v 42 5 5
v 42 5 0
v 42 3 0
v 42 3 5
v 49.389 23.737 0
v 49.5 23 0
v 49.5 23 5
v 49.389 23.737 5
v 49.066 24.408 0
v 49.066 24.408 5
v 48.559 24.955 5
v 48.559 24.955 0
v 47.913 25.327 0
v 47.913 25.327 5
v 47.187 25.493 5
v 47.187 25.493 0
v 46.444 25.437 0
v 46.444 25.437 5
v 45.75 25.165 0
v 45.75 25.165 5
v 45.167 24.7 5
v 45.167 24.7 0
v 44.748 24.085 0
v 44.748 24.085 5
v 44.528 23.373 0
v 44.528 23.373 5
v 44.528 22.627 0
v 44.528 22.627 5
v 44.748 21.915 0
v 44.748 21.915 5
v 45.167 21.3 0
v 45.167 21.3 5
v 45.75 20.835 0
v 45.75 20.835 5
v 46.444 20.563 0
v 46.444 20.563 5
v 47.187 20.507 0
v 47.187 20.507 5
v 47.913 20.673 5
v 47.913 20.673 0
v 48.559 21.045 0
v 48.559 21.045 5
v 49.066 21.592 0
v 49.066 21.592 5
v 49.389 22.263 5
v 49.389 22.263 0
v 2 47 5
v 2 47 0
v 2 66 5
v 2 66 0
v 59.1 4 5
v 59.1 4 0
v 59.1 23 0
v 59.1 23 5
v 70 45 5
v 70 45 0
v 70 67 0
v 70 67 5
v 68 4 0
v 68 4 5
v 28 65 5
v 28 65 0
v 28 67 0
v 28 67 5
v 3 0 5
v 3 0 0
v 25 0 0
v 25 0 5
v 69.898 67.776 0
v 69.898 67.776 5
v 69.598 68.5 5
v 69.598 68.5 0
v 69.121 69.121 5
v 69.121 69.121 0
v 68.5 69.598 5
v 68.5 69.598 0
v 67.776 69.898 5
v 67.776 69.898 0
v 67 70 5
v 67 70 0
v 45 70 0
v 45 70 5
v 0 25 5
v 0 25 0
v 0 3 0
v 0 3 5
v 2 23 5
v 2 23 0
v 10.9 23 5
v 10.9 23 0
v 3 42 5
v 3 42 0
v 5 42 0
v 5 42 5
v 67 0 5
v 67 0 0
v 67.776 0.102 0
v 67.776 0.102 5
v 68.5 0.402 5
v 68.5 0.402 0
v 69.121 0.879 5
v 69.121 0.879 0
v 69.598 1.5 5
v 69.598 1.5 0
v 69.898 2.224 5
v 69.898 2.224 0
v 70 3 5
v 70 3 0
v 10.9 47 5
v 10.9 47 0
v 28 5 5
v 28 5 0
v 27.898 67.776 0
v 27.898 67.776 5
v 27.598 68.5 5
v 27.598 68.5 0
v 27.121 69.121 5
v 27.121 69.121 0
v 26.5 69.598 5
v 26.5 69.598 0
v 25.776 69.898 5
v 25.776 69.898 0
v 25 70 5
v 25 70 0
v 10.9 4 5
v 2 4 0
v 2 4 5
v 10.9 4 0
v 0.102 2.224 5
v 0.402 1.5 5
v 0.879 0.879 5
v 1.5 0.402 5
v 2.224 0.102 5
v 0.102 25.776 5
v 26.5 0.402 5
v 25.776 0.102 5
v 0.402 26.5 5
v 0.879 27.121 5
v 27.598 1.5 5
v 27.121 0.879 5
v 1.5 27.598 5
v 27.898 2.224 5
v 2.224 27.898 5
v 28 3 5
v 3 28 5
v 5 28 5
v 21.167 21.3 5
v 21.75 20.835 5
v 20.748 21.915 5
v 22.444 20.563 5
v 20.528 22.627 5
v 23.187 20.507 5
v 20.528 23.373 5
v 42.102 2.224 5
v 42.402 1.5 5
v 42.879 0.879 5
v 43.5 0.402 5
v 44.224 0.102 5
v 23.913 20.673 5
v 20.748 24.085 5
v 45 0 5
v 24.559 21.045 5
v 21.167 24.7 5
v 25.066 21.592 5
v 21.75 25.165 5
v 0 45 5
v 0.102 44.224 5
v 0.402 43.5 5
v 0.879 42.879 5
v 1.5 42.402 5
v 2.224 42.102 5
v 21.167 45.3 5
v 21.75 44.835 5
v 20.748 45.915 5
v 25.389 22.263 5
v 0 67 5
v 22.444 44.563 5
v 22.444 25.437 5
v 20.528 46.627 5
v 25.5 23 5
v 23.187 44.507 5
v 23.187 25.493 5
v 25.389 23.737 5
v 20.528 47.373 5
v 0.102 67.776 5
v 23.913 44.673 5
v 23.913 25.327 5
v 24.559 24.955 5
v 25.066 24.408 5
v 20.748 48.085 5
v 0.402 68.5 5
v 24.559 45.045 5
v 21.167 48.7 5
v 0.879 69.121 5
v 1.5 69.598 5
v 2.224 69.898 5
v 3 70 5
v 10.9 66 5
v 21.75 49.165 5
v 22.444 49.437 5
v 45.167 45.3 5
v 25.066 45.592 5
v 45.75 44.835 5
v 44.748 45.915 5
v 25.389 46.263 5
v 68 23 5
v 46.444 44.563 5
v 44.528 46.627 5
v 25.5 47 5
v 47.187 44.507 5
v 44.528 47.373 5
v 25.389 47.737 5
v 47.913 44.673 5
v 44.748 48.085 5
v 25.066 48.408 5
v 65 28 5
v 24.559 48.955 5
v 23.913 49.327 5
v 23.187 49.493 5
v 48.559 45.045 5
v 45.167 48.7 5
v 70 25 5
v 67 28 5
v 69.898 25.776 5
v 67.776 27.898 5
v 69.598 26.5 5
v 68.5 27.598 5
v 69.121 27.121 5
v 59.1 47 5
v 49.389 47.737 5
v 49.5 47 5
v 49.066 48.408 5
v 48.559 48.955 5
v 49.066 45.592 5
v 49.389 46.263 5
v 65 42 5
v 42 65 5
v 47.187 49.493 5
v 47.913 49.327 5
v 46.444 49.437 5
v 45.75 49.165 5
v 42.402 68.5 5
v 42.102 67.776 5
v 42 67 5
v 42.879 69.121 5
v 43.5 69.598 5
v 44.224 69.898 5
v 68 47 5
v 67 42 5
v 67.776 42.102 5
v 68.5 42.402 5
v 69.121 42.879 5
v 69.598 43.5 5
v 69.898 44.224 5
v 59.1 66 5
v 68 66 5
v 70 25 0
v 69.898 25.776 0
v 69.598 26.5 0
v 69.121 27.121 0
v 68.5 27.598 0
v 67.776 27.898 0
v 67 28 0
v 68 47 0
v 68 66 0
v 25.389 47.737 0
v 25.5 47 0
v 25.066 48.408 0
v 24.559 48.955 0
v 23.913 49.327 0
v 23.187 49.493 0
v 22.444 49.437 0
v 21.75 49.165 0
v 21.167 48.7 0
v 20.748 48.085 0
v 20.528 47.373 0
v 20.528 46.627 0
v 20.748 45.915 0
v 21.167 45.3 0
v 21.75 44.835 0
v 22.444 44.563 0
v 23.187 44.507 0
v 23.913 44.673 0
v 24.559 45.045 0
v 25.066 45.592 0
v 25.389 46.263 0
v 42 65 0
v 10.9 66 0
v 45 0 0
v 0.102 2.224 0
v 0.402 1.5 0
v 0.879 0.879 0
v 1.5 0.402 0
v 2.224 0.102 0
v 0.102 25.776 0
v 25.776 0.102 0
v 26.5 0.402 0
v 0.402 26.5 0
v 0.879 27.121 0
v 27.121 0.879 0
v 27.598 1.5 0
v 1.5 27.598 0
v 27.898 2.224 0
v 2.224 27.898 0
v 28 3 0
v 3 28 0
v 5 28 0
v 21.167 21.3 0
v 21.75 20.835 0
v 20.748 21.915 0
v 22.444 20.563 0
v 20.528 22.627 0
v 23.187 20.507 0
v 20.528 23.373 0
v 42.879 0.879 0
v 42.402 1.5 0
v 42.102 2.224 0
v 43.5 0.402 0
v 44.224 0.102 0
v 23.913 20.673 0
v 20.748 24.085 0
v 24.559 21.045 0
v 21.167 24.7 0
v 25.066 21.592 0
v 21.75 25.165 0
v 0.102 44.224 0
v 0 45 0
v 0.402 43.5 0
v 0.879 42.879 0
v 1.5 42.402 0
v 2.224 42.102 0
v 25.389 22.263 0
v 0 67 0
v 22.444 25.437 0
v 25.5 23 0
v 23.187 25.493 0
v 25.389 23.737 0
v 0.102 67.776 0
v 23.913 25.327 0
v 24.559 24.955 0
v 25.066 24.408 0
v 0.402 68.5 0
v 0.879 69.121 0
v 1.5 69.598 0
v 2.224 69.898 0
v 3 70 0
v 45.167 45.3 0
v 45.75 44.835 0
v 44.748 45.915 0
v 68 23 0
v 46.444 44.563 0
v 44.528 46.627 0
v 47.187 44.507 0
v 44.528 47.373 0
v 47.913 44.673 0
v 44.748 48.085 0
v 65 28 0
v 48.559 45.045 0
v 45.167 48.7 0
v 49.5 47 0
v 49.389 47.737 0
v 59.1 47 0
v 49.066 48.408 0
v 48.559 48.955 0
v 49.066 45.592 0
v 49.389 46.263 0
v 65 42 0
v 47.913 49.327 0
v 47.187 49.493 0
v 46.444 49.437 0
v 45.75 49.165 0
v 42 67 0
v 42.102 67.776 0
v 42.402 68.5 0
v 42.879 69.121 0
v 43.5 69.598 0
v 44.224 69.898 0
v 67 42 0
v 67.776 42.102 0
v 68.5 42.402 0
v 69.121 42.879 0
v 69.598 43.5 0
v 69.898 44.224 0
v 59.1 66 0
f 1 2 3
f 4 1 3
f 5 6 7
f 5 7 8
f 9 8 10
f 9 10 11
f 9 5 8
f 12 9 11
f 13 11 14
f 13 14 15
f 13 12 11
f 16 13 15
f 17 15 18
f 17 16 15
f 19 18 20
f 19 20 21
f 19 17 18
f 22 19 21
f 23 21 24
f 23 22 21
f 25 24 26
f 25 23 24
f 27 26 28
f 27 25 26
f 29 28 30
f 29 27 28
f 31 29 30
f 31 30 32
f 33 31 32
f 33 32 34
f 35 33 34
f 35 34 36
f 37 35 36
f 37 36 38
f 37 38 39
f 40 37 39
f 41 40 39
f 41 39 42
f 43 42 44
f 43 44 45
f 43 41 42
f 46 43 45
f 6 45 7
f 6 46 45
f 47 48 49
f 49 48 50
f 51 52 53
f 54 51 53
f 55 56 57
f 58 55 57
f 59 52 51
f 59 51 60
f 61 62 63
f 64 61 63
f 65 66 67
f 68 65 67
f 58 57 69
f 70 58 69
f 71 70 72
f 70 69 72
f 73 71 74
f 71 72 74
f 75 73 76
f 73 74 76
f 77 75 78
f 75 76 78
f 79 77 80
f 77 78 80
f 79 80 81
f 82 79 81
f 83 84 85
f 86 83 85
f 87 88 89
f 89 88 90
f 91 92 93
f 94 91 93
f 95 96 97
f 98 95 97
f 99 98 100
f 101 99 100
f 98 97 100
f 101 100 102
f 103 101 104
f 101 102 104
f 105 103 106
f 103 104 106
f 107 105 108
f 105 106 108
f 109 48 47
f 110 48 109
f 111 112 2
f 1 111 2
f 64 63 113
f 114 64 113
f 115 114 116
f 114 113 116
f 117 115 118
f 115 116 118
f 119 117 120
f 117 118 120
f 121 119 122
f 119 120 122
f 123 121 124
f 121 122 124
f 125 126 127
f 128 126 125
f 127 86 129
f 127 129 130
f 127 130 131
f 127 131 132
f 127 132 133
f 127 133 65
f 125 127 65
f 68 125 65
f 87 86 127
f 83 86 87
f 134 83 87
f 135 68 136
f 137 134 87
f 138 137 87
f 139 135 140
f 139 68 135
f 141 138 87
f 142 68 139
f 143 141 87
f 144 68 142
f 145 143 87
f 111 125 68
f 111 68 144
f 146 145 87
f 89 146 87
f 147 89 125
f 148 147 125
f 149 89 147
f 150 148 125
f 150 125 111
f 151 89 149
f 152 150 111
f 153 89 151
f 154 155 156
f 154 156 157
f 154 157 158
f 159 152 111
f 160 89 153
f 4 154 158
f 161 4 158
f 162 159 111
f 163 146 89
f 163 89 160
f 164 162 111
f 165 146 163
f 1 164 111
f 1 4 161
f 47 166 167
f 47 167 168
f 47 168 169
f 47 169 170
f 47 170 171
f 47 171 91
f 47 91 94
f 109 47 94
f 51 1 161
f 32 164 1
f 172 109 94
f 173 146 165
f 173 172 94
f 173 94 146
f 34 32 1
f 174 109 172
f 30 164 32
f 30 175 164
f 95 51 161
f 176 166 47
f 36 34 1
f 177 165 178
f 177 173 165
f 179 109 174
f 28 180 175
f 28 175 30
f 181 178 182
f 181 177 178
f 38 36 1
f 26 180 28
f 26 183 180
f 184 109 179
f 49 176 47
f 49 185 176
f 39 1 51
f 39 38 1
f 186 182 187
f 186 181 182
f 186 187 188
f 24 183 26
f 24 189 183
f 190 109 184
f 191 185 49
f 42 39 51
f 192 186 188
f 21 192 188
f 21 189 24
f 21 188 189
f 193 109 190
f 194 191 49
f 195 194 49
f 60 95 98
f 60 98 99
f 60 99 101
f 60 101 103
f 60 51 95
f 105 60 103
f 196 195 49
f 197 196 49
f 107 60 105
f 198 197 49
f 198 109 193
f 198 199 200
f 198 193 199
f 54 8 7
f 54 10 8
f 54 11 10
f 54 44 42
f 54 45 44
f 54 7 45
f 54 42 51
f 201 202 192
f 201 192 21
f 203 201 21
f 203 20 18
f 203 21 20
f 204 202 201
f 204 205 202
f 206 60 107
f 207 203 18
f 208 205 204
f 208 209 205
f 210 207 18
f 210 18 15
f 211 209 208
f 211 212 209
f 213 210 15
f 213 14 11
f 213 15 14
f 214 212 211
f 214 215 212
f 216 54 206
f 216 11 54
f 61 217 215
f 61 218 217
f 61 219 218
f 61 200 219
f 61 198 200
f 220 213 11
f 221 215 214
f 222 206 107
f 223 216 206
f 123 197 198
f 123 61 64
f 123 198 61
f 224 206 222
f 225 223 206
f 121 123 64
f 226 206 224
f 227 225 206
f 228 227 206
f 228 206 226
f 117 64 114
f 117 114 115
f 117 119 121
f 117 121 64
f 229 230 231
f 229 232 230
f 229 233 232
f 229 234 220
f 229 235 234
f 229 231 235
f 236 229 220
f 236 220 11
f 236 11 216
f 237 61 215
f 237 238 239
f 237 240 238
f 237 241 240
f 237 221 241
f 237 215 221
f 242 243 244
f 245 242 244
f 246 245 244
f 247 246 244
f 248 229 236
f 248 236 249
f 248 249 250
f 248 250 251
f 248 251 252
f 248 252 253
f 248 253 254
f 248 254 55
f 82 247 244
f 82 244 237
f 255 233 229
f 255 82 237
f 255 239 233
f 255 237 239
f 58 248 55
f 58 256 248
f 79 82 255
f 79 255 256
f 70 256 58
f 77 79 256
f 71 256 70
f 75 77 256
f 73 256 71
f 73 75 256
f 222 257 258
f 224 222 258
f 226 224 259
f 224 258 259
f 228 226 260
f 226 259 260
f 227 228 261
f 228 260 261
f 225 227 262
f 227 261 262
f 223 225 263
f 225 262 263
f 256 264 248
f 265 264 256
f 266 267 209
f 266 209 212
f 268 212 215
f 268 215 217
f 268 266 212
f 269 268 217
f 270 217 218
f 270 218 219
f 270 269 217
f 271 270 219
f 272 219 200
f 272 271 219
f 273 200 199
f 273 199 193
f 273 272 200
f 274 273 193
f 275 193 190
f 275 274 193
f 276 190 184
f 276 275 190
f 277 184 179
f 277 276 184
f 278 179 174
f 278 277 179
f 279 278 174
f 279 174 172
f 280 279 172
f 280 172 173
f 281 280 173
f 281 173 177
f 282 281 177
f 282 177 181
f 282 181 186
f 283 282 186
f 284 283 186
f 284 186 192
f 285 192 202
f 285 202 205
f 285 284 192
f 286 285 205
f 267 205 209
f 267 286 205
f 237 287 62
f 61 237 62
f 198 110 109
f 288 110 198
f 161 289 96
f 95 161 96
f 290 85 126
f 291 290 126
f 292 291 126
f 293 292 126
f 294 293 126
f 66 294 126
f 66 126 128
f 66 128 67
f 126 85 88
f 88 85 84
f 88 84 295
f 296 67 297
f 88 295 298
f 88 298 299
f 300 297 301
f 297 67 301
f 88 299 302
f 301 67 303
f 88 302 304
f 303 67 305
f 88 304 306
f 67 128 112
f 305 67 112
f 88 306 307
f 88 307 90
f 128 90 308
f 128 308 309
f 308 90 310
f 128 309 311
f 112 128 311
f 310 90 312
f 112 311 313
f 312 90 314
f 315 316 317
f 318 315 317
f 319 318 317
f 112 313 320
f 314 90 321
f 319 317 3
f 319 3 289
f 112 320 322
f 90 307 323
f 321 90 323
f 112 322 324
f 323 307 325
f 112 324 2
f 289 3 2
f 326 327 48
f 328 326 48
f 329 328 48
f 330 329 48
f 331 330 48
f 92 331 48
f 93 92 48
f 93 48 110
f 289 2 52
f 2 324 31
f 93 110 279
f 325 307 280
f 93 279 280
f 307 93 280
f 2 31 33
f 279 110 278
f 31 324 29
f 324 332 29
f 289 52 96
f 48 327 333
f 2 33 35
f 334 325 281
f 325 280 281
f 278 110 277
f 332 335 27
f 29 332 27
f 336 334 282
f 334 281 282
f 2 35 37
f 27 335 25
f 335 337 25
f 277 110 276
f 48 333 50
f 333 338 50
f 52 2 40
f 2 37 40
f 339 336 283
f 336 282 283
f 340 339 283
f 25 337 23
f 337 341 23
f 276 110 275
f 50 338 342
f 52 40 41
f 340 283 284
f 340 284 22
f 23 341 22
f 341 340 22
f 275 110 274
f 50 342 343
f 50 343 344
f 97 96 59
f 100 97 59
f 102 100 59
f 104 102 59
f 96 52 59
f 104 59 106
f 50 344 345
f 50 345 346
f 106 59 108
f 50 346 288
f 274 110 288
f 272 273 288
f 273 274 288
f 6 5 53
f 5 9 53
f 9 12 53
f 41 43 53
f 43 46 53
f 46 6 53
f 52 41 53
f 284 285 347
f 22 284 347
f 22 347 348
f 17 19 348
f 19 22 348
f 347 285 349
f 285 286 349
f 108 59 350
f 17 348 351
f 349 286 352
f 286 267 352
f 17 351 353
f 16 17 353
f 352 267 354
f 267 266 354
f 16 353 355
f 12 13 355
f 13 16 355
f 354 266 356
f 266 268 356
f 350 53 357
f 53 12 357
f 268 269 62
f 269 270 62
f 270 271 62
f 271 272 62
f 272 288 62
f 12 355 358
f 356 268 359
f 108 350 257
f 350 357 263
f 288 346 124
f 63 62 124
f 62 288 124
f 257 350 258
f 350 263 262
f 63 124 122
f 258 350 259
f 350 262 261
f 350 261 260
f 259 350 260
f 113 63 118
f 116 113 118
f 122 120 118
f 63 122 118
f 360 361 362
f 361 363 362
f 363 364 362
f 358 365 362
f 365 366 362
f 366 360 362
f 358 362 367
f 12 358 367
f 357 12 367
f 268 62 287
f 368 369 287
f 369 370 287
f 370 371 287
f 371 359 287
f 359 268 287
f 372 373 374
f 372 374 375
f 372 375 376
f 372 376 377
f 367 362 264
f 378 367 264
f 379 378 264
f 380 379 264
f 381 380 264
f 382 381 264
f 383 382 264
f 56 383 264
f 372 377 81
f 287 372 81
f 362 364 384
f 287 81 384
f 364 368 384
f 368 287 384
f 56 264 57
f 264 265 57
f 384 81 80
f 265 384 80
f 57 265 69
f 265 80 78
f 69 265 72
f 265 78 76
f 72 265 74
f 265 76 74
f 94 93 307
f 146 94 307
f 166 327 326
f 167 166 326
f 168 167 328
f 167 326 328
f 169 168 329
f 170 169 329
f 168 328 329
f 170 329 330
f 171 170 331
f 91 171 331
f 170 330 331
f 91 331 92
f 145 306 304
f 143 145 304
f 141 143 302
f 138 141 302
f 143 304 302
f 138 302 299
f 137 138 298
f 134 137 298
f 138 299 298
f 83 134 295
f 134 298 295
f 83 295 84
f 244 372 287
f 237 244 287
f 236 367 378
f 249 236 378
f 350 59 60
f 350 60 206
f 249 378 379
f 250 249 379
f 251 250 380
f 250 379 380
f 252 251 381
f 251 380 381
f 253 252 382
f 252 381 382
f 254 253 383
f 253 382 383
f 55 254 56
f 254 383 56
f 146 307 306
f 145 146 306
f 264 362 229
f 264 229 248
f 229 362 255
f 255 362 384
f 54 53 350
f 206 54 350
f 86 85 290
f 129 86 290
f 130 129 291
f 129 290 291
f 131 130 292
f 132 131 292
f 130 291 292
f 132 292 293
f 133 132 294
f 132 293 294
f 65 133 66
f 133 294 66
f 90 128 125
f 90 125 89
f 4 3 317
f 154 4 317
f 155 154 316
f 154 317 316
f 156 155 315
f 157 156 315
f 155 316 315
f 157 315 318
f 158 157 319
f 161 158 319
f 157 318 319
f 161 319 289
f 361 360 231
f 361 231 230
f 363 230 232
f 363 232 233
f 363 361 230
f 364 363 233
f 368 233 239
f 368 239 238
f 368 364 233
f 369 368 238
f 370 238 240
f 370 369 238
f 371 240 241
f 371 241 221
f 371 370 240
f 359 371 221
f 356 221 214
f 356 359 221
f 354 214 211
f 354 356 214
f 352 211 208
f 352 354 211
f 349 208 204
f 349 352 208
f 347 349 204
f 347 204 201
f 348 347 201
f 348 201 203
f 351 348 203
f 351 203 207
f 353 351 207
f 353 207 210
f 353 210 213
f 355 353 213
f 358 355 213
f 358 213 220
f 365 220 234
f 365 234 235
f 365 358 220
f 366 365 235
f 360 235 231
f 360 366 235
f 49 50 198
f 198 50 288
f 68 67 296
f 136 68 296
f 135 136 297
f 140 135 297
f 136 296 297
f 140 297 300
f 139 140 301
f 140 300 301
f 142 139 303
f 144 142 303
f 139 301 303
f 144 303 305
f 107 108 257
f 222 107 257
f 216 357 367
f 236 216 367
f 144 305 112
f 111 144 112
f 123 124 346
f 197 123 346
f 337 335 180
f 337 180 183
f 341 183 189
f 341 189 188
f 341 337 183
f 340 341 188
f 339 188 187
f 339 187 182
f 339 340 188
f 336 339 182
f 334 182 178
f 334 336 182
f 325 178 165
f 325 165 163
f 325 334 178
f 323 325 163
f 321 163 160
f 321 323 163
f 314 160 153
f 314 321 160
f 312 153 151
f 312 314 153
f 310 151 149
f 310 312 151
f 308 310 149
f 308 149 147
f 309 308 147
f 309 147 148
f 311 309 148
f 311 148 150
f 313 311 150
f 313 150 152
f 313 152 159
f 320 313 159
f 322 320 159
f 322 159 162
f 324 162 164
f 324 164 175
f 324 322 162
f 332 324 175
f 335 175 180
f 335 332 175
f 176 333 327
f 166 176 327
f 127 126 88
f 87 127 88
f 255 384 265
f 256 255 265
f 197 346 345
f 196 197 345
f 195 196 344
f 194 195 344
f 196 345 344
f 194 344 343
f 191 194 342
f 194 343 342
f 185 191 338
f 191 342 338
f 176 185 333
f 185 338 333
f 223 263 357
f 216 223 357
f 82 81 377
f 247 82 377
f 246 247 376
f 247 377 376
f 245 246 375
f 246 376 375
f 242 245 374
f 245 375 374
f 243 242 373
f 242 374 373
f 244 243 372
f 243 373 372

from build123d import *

# Parameters (mm, degrees)
SKETCH_1_R      = 2.5
SKETCH_1_W      = 8.9
SKETCH_1_H      = 19
EXTRUDE_1_DEPTH = 5


with BuildPart() as part:
    # 草图1 → 凸台-拉伸1 (new body)
    with BuildSketch(Plane.XY):
        with BuildLine():
            Line((3, 0), (25, 0))
            ThreePointArc((25, 0), (27.121320344, 0.878679656), (28, 3))
            Line((28, 3), (28, 5))
            Line((28, 5), (42, 5))
            Line((42, 5), (42, 3))
            ThreePointArc((42, 3), (42.878679656, 0.878679656), (45, 0))
            Line((45, 0), (67, 0))
            ThreePointArc((67, 0), (69.121320344, 0.878679656), (70, 3))
            Line((70, 3), (70, 25))
            ThreePointArc((70, 25), (69.121320344, 27.121320344), (67, 28))
            Line((67, 28), (65, 28))
            Line((65, 28), (65, 42))
            Line((65, 42), (67, 42))
            ThreePointArc((67, 42), (69.121320344, 42.878679656), (70, 45))
            Line((70, 45), (70, 67))
            ThreePointArc((70, 67), (69.121320344, 69.121320344), (67, 70))
            Line((67, 70), (45, 70))
            ThreePointArc((45, 70), (42.878679656, 69.121320344), (42, 67))
            Line((42, 67), (42, 65))
            Line((42, 65), (28, 65))
            Line((28, 65), (28, 67))
            ThreePointArc((28, 67), (27.121320344, 69.121320344), (25, 70))
            Line((25, 70), (3, 70))
            ThreePointArc((3, 70), (0.878679656, 69.121320344), (0, 67))
            Line((0, 67), (0, 45))
            ThreePointArc((0, 45), (0.878679656, 42.878679656), (3, 42))
            Line((3, 42), (5, 42))
            Line((5, 42), (5, 28))
            Line((5, 28), (3, 28))
            ThreePointArc((3, 28), (0.878679656, 27.121320344), (0, 25))
            Line((0, 25), (0, 3))
            ThreePointArc((0, 3), (0.878679656, 0.878679656), (3, 0))
        make_face()
        with Locations((23, 47)):
            Circle(SKETCH_1_R, mode=Mode.SUBTRACT)
        with Locations((47, 47)):
            Circle(SKETCH_1_R, mode=Mode.SUBTRACT)
        with Locations((23, 23)):
            Circle(SKETCH_1_R, mode=Mode.SUBTRACT)
        with Locations((47, 23)):
            Circle(SKETCH_1_R, mode=Mode.SUBTRACT)
        with Locations((63.55, 56.5)):
            Rectangle(SKETCH_1_W, SKETCH_1_H, mode=Mode.SUBTRACT)
        with Locations((63.55, 13.5)):
            Rectangle(SKETCH_1_W, SKETCH_1_H, mode=Mode.SUBTRACT)
        with Locations((6.45, 56.5)):
            Rectangle(SKETCH_1_W, SKETCH_1_H, mode=Mode.SUBTRACT)
        with Locations((6.45, 13.5)):
            Rectangle(SKETCH_1_W, SKETCH_1_H, mode=Mode.SUBTRACT)
    extrude(amount=EXTRUDE_1_DEPTH)


solid = part.part
